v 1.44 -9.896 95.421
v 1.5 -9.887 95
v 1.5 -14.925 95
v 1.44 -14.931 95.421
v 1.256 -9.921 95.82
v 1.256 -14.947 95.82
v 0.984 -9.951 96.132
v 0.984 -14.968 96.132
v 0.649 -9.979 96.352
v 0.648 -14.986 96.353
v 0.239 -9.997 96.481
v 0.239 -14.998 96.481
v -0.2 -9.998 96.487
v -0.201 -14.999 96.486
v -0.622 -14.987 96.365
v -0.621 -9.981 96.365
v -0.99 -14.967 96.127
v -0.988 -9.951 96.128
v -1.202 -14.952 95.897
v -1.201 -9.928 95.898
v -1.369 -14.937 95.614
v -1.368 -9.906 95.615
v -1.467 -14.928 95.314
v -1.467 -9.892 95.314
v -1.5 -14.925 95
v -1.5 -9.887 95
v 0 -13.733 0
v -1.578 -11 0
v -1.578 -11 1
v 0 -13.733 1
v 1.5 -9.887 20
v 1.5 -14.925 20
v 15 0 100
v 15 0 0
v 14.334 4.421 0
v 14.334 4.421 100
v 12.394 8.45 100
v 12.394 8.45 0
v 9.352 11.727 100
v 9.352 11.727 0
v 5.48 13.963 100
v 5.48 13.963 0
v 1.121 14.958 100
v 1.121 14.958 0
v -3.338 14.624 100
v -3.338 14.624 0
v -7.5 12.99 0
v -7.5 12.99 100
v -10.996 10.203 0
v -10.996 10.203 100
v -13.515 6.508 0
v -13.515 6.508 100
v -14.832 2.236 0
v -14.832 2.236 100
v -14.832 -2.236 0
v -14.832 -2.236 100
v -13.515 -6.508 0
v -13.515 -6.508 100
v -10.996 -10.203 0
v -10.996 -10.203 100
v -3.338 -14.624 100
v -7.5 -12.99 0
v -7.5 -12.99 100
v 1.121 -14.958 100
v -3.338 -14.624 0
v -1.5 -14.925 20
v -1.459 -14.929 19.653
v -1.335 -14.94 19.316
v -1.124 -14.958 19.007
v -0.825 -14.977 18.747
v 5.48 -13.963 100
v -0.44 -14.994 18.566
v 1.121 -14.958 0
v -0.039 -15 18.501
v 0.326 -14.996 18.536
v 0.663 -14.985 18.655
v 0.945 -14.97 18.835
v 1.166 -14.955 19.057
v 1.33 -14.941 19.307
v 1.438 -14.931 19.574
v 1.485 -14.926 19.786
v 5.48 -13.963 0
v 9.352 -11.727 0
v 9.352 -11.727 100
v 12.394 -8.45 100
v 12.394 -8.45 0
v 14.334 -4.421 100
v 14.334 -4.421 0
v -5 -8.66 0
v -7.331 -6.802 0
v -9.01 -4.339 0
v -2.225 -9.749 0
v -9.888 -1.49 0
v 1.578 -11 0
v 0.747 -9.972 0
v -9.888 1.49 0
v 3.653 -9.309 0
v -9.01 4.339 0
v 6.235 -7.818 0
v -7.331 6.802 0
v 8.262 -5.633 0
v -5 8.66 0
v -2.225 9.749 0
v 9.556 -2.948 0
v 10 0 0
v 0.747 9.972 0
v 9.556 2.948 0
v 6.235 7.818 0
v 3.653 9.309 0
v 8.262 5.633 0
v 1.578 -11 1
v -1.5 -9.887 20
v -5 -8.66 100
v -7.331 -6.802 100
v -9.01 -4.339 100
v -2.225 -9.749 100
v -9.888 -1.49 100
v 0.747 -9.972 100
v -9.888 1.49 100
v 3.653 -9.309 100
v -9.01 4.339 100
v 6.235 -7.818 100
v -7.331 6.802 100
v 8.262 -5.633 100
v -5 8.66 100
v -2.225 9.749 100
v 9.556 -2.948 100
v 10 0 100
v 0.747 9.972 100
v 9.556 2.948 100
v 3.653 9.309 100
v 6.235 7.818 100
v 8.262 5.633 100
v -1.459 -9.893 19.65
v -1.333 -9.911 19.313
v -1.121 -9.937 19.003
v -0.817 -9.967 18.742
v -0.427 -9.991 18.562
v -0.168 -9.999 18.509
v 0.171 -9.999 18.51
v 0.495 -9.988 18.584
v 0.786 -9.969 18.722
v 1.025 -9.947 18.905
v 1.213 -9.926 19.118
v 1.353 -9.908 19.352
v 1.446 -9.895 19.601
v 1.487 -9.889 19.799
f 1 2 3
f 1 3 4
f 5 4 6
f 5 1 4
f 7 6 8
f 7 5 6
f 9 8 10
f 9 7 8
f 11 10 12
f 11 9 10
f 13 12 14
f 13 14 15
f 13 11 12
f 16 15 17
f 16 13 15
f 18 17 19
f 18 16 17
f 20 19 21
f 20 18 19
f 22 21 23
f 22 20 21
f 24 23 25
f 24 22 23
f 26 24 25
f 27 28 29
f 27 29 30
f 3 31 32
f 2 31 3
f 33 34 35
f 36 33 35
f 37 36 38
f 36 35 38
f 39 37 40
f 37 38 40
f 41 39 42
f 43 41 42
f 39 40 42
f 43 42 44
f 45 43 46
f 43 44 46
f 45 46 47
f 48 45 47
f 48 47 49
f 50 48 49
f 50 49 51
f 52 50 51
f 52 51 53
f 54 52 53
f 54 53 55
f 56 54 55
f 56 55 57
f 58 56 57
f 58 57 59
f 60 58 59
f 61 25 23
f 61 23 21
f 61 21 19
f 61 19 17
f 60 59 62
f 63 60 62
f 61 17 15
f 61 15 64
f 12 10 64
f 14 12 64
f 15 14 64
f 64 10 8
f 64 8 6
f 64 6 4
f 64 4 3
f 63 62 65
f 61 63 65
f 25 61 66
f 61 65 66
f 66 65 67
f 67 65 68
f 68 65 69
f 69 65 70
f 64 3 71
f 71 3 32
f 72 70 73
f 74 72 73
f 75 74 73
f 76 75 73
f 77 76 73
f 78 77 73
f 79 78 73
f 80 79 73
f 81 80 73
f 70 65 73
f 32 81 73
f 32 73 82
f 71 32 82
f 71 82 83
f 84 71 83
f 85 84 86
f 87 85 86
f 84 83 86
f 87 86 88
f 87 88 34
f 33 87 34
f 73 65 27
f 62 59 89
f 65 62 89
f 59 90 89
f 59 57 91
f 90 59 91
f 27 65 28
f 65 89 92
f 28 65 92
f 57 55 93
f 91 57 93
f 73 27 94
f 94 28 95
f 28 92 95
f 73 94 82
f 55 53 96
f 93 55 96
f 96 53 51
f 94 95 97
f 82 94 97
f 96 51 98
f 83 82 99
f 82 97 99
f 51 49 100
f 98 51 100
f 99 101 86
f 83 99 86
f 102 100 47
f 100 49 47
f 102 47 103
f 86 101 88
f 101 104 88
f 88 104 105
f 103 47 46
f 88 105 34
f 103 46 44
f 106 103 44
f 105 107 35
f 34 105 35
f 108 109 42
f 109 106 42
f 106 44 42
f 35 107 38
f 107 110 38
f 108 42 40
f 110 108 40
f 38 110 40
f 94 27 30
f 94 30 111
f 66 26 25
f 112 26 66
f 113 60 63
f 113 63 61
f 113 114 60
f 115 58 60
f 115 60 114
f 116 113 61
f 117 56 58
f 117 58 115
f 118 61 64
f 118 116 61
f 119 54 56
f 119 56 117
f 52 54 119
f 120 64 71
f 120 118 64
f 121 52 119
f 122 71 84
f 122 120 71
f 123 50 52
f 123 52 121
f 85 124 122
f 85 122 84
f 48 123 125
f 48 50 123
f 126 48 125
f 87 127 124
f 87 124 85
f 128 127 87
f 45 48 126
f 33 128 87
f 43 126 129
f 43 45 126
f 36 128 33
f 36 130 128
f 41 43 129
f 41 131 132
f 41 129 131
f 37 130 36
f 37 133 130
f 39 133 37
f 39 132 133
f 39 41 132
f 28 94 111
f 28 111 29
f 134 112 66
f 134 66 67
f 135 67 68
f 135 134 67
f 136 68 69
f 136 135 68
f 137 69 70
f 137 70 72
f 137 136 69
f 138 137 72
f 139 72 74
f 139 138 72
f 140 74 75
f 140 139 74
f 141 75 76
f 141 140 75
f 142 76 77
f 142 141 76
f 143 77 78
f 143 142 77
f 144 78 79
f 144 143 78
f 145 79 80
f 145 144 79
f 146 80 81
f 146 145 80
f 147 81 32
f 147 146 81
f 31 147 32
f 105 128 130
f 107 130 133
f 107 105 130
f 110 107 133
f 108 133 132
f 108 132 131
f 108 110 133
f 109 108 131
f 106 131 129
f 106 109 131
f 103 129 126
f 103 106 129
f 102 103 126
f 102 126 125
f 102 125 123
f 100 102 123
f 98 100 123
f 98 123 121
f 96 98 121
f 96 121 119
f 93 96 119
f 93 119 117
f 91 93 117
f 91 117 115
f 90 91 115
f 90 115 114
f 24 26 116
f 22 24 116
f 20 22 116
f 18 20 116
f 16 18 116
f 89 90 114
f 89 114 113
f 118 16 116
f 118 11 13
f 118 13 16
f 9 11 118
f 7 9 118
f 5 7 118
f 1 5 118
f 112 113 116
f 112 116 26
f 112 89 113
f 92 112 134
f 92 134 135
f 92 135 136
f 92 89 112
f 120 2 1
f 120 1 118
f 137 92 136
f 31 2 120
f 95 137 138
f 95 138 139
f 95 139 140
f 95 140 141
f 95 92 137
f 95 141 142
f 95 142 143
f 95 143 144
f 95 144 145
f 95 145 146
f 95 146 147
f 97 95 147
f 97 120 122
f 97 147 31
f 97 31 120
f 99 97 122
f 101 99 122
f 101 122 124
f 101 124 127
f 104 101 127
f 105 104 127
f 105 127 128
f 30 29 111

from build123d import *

# Parameters (mm, degrees)
SKETCH1_R           = 15
SKETCH1_R_2         = 10
BOSS_EXTRUDE1_DEPTH = 100
CUT_EXTRUDE1_DEPTH  = 1
CUT_EXTRUDE2_DEPTH  = 103.225241501


with BuildPart() as part:
    # Sketch1 → Boss-Extrude1 (new body)
    with BuildSketch(Plane(origin=(0, 0, 0), x_dir=(0, 1, 0), z_dir=(0, 0, 1))):
        with Locations(Location((0, 0, 0), (0, 0, 270))):
            Circle(SKETCH1_R)
        with Locations(Location((0, 0, 0), (0, 0, 270))):
            Circle(SKETCH1_R_2, mode=Mode.SUBTRACT)
    extrude(amount=BOSS_EXTRUDE1_DEPTH)

    # Sketch2 → Cut-Extrude1 (cut)
    with BuildSketch(Plane(origin=(0, 0, 0), x_dir=(-1, 0, 0), z_dir=(0, 0, -1))):
        Polygon((0, -13.732646586), (-1.577694242, -11), (1.577694242, -11), align=None)
    extrude(amount=-CUT_EXTRUDE1_DEPTH, mode=Mode.SUBTRACT)

    # Sketch4 → Cut-Extrude2 (cut, through all)
    with BuildSketch(Plane(origin=(0, 0, 0), x_dir=(-1, 0, 0), z_dir=(0, 1, 0))):
        with BuildLine():
            Line((-1.5, 20), (-1.5, 95))
            ThreePointArc((-1.5, 95), (0, 96.5), (1.5, 95))
            Line((1.5, 95), (1.5, 20))
            ThreePointArc((1.5, 20), (0, 18.5), (-1.5, 20))
        make_face()
    extrude(amount=-CUT_EXTRUDE2_DEPTH, mode=Mode.SUBTRACT)


solid = part.part
